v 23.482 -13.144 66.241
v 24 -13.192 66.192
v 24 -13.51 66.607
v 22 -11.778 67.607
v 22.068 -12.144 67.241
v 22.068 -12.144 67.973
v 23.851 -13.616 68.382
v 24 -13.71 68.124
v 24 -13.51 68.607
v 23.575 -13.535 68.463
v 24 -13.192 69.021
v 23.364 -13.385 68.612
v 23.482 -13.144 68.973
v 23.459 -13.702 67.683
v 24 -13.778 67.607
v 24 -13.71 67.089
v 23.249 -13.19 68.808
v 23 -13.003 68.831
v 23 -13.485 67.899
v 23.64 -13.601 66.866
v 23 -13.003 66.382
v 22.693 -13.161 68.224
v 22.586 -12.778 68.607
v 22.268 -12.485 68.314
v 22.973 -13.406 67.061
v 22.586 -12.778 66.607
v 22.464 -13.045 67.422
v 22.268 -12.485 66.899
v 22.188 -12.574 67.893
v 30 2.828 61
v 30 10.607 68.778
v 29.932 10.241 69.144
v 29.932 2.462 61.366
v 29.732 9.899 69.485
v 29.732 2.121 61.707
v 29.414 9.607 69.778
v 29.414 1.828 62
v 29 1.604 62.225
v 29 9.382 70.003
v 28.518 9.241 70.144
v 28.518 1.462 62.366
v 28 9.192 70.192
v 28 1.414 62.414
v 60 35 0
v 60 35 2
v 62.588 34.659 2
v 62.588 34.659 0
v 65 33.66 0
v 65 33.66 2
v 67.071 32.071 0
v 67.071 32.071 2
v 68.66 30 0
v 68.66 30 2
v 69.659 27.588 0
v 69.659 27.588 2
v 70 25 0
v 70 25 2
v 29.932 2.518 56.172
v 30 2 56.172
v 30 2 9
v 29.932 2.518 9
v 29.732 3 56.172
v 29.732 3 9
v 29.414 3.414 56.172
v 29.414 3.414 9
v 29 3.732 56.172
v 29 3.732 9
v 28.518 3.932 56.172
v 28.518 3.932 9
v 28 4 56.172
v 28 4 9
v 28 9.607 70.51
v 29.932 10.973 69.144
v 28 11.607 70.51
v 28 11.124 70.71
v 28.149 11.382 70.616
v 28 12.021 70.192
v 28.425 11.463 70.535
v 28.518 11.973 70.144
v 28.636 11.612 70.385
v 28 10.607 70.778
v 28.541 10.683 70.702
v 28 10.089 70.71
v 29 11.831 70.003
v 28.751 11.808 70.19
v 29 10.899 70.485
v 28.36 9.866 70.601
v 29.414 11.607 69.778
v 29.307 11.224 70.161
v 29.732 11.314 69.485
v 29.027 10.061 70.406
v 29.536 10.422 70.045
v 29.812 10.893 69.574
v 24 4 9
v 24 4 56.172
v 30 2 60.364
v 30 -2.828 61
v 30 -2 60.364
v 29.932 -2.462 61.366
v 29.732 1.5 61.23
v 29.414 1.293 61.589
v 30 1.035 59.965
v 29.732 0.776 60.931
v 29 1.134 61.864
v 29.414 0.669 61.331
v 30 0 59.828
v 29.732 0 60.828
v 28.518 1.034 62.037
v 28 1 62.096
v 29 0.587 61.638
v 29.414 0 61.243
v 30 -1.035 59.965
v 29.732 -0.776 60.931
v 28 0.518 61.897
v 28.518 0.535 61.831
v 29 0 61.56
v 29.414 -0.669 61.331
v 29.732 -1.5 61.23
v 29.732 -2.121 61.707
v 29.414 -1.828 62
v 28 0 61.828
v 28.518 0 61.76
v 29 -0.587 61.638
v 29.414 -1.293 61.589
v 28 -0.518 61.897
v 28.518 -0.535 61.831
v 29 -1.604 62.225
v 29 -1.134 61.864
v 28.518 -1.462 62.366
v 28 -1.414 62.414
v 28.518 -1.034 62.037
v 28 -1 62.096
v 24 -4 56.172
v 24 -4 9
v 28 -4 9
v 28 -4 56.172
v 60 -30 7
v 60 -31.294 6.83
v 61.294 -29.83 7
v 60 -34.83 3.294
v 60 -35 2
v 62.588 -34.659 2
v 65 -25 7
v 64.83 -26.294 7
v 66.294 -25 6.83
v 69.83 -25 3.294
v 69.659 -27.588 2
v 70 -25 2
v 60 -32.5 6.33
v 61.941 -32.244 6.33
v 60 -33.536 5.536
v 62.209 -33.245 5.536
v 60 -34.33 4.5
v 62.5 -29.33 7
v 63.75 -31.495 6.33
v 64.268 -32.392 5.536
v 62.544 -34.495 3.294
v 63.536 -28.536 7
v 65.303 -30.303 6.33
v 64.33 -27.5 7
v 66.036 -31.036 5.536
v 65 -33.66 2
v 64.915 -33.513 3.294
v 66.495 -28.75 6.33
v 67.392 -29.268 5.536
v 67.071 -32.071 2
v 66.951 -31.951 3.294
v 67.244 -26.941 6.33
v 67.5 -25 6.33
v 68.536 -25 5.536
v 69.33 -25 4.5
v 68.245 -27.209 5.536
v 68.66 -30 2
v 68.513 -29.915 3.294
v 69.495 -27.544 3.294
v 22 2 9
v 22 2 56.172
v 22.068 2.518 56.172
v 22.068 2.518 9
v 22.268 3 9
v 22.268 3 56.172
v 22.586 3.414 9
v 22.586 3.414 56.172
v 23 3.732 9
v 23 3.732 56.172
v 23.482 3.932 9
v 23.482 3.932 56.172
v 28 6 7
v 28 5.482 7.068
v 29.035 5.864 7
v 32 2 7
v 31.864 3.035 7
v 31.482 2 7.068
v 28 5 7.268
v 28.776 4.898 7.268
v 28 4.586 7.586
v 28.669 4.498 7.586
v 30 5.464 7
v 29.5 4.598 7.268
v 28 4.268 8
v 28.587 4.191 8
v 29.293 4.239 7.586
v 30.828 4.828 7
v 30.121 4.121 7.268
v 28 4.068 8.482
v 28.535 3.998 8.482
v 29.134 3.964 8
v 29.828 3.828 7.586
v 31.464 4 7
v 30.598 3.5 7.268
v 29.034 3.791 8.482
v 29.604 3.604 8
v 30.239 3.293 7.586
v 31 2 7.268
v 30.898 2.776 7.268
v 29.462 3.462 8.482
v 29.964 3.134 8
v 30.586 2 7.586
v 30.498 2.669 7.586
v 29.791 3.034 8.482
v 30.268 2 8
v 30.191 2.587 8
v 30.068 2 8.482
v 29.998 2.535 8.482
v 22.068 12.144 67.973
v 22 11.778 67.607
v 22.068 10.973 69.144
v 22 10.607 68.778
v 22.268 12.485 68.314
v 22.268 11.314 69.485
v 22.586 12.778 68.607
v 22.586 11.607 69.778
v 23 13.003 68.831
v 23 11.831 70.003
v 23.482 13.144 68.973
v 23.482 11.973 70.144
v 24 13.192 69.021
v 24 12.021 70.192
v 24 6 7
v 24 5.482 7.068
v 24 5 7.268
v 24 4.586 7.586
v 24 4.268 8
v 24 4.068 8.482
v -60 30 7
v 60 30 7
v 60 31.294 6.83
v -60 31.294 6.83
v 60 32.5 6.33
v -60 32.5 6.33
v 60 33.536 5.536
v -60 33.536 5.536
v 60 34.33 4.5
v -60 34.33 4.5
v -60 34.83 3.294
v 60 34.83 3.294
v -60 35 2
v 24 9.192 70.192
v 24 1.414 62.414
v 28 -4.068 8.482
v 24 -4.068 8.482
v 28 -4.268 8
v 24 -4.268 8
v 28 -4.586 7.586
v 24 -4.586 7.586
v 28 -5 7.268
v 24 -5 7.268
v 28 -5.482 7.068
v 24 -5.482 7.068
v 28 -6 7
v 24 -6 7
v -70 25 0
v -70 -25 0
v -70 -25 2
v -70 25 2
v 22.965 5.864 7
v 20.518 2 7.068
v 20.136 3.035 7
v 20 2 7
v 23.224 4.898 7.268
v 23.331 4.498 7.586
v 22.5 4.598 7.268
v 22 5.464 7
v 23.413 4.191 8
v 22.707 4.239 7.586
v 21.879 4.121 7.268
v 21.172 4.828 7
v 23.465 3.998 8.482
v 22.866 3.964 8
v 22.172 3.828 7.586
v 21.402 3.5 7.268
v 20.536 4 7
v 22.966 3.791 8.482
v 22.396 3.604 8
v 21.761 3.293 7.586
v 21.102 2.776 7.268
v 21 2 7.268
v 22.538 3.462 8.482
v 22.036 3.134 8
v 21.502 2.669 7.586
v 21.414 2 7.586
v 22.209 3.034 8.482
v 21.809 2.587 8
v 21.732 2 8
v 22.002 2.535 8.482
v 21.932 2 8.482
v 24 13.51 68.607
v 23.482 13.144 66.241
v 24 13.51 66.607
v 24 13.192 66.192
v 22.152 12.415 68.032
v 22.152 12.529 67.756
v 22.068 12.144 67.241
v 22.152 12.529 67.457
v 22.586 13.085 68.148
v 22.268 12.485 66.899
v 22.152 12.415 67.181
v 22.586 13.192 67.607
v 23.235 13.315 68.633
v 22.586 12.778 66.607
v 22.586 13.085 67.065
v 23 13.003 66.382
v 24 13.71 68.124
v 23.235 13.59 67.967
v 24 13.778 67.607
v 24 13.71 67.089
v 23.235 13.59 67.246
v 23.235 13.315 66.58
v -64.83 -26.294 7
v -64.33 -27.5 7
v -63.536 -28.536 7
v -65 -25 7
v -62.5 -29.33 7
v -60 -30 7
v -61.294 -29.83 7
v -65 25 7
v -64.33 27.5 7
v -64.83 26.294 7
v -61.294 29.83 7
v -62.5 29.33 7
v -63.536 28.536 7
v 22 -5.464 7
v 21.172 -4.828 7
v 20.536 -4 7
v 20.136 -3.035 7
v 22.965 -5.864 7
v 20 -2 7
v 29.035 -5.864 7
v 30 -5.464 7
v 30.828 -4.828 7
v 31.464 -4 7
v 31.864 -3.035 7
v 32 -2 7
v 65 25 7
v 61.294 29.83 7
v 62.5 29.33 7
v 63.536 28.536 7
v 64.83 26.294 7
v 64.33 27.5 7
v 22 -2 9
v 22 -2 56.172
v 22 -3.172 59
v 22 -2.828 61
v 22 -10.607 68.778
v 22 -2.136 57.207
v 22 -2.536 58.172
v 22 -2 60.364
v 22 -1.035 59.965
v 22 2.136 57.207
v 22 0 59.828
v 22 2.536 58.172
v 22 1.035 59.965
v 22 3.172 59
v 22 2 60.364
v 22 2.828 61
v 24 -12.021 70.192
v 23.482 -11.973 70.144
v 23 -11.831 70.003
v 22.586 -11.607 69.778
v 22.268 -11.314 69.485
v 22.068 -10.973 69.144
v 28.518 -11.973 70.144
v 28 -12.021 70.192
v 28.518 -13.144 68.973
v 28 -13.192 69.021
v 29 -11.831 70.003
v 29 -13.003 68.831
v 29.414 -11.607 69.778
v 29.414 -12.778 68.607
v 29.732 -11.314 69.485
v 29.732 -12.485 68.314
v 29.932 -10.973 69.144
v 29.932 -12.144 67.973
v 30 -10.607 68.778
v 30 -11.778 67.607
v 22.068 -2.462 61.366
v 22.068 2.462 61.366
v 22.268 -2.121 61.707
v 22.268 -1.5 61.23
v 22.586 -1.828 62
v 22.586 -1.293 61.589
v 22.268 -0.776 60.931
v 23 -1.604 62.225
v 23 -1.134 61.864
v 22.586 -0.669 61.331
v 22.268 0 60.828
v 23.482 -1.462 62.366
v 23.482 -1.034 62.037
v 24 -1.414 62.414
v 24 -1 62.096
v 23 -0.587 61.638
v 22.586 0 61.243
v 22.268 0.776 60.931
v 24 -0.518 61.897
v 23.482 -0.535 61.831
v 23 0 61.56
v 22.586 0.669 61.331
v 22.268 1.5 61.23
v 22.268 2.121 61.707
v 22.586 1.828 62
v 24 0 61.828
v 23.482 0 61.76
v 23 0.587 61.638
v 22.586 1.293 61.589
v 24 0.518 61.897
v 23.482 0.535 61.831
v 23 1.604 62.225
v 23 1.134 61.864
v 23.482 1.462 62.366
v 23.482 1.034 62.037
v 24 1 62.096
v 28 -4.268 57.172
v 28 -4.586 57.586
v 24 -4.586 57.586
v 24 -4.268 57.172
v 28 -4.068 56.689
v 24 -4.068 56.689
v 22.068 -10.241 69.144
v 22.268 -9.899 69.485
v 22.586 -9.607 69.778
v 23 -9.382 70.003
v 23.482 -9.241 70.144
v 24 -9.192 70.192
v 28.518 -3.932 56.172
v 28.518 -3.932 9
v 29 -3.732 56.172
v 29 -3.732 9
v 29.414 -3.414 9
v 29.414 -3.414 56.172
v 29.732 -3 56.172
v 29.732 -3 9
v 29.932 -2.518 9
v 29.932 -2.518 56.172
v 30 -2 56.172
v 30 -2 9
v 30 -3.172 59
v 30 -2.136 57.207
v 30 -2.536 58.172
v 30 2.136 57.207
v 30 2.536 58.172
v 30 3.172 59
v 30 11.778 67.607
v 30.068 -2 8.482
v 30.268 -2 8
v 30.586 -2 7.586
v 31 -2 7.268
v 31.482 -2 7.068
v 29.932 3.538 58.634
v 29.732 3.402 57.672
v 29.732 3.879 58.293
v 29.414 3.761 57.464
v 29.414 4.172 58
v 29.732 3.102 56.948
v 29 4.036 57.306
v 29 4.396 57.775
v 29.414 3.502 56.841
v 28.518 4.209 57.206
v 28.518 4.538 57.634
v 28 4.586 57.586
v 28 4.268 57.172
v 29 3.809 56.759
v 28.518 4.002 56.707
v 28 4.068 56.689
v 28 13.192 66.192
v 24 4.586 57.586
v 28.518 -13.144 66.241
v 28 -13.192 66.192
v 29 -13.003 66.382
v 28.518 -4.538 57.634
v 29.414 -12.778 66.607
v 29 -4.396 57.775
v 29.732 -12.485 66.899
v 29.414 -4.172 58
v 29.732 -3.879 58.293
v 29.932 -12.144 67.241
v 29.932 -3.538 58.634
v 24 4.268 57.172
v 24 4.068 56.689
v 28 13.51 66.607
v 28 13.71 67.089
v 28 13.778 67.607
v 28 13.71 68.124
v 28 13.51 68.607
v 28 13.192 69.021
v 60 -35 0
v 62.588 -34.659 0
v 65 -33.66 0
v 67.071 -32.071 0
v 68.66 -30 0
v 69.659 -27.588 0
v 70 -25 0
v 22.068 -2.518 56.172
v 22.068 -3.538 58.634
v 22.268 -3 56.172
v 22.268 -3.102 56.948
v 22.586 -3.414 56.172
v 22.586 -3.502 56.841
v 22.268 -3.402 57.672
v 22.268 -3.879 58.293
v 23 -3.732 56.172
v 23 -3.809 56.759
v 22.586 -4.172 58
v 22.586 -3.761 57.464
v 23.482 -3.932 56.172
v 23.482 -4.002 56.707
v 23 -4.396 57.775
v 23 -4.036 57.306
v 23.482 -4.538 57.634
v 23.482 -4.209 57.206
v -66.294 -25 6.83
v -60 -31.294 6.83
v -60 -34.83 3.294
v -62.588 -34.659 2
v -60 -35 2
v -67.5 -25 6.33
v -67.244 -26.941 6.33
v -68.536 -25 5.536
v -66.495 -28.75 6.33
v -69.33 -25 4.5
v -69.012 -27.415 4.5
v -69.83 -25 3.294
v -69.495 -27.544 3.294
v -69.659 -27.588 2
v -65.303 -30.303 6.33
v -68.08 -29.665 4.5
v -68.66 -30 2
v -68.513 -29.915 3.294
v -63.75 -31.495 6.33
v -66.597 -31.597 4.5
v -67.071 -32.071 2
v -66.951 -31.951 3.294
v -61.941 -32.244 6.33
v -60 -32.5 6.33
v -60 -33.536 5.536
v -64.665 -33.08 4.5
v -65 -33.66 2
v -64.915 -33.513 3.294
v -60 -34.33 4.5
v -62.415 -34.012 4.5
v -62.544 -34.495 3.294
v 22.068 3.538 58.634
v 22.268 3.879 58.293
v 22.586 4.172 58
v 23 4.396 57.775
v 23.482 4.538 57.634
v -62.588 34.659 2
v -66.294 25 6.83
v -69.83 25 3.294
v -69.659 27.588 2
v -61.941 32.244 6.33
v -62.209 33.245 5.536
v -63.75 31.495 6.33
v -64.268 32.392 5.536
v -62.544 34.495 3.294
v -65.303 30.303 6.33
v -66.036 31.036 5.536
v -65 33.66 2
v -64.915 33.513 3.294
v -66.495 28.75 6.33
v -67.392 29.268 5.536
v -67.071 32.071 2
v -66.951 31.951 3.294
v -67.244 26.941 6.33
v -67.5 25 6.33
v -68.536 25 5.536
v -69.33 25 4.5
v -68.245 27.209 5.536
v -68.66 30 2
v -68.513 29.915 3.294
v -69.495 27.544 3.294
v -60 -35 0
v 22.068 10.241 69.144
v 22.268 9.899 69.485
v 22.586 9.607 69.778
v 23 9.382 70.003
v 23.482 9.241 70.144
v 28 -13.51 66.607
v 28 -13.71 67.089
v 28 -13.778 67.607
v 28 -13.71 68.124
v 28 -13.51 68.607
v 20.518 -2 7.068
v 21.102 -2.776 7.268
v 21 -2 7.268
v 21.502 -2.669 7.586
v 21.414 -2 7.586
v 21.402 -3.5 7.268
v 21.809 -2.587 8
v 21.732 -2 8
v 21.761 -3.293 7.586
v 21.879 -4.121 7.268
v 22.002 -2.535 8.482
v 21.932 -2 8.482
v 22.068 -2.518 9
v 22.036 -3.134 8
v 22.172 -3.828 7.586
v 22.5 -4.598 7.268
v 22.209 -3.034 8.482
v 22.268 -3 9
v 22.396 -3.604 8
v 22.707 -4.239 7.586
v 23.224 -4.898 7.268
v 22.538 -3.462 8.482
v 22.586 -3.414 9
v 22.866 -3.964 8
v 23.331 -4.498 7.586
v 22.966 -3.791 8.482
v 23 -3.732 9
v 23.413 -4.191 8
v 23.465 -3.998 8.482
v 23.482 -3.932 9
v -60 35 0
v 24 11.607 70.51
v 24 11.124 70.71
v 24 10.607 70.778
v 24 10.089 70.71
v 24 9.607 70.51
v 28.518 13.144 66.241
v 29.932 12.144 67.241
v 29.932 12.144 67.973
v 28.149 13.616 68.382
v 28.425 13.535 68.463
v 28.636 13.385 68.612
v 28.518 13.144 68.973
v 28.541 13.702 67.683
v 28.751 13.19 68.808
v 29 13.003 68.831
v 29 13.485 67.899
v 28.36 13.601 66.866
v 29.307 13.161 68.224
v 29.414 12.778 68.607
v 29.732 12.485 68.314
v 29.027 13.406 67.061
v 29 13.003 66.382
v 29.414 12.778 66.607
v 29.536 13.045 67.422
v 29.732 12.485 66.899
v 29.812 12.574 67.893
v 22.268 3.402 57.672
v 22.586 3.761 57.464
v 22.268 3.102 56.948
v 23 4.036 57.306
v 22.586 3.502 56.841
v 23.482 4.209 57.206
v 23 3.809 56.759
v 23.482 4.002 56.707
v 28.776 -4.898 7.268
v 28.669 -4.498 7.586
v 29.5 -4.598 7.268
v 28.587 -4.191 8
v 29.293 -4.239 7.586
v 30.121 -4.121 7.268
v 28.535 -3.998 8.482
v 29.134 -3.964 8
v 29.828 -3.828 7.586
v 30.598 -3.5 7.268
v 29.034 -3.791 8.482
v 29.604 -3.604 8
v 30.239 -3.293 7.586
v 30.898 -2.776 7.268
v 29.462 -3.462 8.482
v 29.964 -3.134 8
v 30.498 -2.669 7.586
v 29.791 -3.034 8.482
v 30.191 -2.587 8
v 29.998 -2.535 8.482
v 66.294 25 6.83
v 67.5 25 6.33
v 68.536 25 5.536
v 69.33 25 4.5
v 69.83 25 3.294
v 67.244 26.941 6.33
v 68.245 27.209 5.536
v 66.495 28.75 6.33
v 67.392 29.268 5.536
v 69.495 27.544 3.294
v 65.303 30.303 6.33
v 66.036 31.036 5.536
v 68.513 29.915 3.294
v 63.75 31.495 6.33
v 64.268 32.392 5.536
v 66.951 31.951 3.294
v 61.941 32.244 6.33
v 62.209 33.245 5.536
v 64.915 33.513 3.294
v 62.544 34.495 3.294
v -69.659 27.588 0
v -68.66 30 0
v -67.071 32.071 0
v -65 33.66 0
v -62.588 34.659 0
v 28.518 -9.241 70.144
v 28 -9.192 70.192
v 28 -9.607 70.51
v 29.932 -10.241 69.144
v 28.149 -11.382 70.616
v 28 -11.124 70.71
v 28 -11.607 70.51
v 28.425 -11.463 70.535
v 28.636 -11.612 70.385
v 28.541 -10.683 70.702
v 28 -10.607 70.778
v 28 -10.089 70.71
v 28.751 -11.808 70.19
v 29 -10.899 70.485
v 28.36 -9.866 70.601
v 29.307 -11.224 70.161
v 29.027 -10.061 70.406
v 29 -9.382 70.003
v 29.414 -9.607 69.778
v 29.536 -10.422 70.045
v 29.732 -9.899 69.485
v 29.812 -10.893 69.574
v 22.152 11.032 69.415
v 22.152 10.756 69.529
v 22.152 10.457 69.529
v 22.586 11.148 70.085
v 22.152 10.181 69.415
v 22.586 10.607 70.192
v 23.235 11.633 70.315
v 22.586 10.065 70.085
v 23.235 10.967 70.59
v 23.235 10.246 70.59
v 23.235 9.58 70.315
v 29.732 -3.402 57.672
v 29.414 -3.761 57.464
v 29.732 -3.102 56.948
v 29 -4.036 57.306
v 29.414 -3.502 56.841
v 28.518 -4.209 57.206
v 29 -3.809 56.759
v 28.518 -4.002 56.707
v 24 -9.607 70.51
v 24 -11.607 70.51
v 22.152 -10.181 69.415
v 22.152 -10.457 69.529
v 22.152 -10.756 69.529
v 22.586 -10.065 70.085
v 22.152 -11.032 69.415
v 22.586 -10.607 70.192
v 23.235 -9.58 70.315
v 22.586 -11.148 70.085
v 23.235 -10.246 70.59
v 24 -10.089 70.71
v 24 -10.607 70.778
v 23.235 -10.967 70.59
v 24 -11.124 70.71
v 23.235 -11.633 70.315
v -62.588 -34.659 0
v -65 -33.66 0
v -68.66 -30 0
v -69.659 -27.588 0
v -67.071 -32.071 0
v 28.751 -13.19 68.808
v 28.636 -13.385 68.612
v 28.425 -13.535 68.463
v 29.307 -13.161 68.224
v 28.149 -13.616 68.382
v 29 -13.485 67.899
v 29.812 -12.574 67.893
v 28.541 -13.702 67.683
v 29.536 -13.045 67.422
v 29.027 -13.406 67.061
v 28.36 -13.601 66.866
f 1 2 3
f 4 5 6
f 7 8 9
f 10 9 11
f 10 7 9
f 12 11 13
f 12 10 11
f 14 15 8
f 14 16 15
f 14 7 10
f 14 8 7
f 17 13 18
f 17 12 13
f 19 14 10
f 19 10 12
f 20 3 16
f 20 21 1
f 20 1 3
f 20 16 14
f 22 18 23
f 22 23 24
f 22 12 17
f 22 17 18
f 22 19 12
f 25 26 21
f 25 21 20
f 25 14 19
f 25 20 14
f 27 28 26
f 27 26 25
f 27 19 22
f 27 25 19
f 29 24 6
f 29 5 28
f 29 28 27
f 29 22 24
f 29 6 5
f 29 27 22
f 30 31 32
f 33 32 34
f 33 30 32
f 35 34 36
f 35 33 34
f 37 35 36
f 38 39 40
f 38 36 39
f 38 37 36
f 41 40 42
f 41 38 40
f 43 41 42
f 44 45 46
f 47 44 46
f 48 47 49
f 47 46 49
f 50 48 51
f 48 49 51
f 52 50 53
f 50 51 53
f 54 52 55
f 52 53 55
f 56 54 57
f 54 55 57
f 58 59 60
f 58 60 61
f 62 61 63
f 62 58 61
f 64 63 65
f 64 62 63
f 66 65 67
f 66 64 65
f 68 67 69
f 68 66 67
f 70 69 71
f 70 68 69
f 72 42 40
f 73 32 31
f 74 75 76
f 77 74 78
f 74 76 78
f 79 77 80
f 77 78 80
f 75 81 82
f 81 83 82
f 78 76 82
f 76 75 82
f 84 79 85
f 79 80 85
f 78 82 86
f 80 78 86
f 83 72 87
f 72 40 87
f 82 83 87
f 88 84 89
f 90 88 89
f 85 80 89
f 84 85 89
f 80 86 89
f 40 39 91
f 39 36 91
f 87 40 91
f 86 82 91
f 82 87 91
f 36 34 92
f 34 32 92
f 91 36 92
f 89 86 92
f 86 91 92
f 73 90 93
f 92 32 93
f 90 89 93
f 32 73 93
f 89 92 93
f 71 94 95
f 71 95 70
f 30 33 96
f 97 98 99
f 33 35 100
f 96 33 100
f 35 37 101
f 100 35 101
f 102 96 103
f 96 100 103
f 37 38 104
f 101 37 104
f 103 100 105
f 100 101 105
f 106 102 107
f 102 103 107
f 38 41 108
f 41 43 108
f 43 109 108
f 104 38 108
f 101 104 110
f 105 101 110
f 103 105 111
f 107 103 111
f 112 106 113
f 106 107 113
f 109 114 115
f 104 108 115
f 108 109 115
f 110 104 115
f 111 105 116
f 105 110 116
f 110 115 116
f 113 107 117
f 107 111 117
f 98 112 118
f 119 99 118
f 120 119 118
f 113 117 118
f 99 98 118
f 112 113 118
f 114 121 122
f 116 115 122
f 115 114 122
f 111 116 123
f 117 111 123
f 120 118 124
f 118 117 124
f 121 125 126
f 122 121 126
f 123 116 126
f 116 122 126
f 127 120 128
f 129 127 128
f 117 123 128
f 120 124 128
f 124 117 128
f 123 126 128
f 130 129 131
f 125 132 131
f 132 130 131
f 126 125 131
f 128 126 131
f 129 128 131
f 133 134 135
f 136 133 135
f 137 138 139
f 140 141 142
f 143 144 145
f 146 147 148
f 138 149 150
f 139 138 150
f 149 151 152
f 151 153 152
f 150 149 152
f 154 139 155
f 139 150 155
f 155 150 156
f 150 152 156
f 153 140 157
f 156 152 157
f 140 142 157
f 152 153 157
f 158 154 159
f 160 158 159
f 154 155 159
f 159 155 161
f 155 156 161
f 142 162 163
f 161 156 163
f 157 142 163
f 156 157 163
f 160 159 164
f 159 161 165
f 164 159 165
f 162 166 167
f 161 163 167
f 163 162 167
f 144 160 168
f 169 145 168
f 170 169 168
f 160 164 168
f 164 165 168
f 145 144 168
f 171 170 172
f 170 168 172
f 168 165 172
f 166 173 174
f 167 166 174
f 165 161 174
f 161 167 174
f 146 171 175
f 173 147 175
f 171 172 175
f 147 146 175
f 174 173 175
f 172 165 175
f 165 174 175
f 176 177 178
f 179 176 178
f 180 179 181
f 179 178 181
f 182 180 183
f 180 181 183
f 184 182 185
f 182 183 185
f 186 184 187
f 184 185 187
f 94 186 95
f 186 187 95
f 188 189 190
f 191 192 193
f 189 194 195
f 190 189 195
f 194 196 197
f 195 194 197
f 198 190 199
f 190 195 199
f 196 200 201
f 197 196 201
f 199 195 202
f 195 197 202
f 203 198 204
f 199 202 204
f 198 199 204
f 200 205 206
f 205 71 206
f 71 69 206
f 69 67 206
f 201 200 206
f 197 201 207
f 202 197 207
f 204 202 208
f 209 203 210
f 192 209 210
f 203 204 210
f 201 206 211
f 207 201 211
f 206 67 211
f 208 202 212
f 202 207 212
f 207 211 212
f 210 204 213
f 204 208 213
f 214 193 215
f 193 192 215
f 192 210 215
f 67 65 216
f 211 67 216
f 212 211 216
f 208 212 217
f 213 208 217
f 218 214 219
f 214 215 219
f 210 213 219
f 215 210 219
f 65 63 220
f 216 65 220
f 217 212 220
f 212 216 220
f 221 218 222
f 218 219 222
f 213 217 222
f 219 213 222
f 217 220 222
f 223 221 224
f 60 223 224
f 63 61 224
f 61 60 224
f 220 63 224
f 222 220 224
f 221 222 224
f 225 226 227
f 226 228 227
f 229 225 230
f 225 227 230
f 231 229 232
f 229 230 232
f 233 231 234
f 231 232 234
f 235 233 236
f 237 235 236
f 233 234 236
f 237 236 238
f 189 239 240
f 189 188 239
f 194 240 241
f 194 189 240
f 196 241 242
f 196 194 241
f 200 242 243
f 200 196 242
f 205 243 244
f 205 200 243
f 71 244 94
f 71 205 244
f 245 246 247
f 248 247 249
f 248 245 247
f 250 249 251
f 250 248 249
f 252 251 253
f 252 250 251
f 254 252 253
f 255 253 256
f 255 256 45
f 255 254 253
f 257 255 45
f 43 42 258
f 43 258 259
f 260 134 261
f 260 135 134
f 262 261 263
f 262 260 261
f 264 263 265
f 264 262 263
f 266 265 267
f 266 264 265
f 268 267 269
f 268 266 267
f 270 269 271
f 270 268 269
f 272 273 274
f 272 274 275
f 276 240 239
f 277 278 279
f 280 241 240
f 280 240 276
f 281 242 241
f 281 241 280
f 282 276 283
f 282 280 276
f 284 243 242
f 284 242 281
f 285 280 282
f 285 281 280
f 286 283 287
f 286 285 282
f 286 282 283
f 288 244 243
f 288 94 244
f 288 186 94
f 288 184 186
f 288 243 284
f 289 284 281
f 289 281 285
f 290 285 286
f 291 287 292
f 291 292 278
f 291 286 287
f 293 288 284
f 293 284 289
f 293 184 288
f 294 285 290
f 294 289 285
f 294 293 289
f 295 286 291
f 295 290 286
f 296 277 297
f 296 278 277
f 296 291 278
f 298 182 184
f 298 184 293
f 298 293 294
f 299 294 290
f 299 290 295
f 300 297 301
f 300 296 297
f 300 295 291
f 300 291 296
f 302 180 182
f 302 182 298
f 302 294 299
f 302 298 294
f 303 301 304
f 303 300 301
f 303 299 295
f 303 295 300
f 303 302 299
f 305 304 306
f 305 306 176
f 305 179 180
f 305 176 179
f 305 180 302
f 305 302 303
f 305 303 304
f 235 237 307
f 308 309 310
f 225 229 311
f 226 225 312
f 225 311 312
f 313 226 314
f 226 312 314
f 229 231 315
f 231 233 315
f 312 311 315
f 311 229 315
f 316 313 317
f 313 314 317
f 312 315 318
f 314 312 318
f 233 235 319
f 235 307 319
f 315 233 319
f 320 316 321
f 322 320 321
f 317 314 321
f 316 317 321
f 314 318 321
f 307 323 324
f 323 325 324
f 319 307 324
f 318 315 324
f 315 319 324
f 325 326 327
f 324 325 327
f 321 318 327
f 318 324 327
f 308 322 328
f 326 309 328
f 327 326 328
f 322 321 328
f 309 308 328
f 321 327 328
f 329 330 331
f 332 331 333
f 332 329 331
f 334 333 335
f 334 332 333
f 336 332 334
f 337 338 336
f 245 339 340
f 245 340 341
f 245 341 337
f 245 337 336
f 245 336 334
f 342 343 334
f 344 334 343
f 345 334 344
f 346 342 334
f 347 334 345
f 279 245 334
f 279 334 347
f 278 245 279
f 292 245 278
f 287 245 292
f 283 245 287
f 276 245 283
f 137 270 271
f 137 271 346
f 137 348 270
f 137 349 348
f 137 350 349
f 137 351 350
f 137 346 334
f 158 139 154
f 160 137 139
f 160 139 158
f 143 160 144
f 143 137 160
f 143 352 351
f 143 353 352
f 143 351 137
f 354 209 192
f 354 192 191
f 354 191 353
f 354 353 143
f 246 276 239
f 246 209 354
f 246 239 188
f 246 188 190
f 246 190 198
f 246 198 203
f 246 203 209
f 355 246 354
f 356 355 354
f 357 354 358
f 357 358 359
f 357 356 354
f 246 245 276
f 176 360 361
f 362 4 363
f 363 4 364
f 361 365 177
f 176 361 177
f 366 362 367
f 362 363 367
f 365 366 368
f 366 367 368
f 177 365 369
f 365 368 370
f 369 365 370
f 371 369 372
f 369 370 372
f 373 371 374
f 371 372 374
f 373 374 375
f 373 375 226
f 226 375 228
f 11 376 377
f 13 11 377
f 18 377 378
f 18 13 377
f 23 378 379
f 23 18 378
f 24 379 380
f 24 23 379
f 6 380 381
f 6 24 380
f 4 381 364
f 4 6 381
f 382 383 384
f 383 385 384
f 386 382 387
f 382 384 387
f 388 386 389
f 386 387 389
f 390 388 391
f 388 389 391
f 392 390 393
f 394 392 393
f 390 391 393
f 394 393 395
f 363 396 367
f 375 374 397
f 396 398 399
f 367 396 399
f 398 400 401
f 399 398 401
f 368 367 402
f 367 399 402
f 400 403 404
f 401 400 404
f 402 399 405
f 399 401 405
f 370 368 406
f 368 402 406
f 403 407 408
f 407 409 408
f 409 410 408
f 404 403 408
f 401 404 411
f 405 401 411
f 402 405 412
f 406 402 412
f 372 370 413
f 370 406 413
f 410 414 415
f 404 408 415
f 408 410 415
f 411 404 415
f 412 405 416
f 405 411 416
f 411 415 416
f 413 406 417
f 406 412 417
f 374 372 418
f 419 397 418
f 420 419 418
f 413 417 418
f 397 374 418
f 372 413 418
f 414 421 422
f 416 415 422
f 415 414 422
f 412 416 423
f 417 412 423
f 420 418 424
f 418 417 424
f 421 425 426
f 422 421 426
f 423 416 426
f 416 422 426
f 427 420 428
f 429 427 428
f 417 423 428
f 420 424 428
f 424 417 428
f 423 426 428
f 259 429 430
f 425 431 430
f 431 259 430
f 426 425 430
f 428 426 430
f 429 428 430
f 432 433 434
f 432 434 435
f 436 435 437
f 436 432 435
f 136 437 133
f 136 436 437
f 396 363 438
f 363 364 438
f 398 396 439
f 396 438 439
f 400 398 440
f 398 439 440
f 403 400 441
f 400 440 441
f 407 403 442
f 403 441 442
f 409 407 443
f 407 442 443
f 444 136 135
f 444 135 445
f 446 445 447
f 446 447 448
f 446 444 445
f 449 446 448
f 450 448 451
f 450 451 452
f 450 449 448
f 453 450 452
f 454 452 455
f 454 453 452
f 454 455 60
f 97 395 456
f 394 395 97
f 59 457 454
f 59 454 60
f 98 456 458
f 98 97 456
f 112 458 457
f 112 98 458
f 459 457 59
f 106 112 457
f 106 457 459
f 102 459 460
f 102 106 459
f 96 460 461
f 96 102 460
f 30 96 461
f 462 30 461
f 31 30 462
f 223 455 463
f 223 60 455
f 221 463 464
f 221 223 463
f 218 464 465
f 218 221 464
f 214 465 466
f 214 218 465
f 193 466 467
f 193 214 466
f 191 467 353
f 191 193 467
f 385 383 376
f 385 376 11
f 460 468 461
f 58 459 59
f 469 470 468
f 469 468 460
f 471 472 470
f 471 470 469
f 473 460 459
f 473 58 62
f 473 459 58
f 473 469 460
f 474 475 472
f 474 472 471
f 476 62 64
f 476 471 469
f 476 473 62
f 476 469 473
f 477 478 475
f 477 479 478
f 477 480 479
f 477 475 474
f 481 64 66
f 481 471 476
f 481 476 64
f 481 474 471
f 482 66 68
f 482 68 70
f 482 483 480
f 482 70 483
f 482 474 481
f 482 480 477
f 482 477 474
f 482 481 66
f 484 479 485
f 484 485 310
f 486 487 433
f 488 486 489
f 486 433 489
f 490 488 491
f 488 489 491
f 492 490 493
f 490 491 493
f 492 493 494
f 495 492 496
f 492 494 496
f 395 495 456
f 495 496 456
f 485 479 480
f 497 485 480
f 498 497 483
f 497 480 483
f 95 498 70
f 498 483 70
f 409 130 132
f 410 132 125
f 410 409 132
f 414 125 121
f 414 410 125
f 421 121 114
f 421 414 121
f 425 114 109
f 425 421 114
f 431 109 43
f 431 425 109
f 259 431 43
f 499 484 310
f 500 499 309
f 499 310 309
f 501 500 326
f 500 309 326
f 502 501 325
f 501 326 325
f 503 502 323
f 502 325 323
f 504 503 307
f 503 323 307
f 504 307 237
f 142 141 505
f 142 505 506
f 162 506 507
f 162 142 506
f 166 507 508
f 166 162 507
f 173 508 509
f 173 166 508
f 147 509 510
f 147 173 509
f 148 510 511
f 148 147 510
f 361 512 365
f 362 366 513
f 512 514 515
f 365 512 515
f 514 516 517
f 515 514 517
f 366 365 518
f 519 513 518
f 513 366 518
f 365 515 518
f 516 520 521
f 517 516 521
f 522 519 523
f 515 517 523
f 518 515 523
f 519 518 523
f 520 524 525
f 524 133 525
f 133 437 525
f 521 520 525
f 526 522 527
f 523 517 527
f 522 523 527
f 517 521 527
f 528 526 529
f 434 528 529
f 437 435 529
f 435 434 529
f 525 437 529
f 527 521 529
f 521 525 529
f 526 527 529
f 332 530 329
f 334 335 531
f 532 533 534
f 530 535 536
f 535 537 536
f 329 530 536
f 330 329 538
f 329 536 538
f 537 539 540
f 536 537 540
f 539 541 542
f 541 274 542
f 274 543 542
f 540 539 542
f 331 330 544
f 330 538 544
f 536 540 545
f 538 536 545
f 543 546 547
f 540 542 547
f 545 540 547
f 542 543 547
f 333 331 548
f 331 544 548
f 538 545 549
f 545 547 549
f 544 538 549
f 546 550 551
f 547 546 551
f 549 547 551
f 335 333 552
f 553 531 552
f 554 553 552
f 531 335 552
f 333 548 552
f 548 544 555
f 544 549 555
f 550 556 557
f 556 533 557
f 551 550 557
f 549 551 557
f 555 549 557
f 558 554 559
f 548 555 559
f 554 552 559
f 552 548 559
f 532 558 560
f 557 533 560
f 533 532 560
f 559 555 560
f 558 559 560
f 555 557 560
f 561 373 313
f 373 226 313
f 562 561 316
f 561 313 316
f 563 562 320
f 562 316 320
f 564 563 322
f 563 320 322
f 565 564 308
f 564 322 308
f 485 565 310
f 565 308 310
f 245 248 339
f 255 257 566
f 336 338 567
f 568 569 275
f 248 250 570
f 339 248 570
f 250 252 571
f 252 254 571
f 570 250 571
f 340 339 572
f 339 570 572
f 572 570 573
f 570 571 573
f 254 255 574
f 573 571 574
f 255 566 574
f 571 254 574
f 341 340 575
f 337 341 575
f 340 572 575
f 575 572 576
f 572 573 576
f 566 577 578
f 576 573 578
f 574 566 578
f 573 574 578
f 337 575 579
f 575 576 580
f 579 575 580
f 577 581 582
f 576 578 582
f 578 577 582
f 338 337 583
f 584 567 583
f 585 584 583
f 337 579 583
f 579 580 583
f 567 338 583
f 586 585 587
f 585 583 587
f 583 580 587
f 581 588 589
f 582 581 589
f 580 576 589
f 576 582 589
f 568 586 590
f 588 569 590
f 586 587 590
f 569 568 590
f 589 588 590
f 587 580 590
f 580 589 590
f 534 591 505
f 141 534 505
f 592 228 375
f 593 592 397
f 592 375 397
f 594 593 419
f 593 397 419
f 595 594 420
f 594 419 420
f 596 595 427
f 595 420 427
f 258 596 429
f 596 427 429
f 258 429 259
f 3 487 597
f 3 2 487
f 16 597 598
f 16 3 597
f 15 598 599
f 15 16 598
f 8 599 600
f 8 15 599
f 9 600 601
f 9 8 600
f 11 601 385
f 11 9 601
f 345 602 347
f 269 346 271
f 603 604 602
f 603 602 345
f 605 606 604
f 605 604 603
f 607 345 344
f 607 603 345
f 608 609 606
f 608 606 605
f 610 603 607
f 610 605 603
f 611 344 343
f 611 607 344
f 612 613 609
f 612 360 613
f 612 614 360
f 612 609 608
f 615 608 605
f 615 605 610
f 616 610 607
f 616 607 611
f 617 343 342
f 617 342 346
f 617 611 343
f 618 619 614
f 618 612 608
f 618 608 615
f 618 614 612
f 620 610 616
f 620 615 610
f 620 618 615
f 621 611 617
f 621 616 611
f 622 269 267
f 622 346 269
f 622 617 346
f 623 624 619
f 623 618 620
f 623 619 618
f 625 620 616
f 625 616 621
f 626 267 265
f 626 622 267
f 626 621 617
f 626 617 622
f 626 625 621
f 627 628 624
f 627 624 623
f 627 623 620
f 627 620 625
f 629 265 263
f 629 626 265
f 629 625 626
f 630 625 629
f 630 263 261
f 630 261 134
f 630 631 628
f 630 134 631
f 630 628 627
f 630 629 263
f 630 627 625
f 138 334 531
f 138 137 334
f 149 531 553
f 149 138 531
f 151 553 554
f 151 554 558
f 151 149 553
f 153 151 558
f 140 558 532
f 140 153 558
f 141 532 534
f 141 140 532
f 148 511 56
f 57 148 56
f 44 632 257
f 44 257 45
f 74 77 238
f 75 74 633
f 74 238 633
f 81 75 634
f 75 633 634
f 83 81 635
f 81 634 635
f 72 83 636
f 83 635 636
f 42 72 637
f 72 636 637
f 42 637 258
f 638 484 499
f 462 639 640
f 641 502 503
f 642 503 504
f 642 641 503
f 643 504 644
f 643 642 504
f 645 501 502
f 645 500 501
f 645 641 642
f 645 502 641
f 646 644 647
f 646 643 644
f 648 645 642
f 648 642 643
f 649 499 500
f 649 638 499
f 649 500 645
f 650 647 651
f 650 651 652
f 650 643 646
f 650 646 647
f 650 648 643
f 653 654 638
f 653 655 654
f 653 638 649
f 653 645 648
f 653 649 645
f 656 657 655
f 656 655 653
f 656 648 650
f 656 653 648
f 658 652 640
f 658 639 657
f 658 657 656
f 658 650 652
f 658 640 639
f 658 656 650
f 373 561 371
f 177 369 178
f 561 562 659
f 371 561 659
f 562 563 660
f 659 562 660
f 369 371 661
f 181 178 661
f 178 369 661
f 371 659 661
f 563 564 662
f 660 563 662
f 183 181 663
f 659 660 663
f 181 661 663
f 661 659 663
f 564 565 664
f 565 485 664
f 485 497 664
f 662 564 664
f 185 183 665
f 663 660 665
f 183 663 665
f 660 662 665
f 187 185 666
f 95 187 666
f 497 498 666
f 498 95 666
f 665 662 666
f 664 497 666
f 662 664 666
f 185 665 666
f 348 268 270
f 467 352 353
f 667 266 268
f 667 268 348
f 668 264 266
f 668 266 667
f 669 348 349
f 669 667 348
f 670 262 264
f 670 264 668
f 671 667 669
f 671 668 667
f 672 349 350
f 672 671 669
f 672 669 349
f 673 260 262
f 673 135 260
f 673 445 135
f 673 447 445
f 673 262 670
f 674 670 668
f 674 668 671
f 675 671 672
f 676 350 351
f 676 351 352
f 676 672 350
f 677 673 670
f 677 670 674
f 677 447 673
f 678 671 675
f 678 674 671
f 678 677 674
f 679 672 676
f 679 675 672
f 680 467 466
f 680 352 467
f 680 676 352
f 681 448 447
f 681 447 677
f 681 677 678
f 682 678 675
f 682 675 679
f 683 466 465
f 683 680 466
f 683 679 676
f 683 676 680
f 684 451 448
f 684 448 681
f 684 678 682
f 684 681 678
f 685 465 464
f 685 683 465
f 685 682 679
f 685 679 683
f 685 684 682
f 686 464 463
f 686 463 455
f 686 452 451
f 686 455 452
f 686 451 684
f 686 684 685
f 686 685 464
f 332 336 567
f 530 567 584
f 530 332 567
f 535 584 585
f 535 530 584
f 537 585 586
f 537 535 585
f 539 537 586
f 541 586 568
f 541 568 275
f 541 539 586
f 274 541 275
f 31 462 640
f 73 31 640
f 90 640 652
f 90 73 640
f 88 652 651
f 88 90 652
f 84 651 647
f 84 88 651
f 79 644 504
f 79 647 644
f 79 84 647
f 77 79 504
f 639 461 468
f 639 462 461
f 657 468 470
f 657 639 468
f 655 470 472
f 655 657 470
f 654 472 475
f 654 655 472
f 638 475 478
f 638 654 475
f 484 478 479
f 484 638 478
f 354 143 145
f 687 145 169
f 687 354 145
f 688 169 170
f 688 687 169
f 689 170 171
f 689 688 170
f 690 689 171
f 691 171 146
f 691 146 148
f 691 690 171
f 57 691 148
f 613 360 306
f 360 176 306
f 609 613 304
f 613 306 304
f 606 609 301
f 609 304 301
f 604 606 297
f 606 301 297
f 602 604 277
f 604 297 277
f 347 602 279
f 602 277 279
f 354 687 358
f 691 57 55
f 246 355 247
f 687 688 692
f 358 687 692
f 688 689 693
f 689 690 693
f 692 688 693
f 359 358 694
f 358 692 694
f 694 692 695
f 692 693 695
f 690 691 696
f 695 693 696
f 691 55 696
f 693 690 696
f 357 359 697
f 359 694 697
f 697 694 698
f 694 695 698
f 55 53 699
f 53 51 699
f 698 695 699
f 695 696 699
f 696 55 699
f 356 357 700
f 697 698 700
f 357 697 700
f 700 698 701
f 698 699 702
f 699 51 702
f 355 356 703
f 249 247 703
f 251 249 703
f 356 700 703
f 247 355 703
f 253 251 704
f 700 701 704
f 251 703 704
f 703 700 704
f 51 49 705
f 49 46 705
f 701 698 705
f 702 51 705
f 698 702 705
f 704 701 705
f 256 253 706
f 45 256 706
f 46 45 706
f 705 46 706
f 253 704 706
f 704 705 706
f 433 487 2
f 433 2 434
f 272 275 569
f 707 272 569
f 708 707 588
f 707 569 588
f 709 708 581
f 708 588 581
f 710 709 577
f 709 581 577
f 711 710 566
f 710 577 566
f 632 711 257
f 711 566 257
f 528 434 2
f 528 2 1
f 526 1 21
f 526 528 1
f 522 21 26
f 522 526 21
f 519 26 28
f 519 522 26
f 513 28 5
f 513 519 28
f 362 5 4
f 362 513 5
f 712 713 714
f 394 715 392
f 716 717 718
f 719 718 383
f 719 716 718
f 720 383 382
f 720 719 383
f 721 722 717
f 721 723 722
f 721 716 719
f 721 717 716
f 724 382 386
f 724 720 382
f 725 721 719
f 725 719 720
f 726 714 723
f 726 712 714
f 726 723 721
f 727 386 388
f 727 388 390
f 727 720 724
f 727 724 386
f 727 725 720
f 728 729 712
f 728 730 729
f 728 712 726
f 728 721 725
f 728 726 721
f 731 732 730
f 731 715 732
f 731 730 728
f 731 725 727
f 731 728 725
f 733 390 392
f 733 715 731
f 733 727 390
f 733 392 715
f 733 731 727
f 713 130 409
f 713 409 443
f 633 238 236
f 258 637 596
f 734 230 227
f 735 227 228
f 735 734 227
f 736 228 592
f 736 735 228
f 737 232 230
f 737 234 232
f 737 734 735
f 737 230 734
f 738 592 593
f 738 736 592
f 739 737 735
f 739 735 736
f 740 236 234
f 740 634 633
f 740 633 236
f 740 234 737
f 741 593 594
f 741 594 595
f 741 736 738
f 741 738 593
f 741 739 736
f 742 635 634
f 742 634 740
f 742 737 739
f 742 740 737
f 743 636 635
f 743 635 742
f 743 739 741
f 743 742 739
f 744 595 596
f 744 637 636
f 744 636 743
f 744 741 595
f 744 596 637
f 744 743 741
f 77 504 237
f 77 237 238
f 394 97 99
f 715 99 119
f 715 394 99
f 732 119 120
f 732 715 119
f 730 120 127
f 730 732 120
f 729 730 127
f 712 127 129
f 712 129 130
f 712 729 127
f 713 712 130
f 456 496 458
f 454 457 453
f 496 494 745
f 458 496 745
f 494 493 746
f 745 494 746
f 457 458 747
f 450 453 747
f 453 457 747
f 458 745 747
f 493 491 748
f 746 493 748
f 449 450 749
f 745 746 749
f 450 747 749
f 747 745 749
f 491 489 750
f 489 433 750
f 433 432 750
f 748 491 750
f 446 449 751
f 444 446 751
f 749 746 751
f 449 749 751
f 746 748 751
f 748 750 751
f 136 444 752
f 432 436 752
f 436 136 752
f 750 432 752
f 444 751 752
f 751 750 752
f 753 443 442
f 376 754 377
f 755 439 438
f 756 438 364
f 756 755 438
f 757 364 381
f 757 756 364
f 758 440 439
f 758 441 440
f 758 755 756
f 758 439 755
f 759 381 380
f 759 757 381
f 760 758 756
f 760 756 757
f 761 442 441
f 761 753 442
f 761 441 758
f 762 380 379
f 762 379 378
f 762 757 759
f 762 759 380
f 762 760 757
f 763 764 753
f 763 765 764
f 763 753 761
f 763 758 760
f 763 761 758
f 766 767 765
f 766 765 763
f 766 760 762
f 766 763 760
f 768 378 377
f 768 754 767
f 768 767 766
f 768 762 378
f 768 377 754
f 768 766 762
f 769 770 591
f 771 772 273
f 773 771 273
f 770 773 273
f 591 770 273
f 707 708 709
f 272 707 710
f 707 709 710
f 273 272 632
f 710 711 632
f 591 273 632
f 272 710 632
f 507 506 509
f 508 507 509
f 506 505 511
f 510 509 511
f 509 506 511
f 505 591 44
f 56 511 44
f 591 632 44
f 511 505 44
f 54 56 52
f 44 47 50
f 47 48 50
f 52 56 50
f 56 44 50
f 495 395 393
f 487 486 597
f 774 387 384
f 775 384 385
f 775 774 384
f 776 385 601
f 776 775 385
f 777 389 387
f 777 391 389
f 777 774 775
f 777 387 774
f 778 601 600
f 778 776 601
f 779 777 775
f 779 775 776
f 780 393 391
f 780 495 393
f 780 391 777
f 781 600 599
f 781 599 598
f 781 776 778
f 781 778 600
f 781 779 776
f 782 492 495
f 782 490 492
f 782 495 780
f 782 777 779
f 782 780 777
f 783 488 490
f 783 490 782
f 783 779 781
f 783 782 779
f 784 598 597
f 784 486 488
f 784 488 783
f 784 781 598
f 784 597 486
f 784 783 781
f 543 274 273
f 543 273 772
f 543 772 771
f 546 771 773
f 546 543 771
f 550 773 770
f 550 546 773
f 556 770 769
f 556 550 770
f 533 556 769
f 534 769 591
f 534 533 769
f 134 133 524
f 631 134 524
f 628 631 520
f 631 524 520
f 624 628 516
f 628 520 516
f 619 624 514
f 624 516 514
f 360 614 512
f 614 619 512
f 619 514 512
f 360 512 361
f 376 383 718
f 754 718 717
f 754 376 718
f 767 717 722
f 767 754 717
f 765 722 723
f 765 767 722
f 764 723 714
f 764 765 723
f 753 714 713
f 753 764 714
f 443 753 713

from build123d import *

# Parameters (mm, degrees)
F0_W     = 140
F0_H     = 70
F1_DEPTH = 7
F2_W     = 8
F2_H     = 8
F3_DEPTH = 50
F5_DEPTH = 8
F6_R     = 10
F7_R     = 5
F9_R     = 2


with BuildPart() as f1:
    # F0 (on Top) → F1 (new body)
    with BuildSketch(Plane.XY):
        Rectangle(F0_W, F0_H)
    extrude(amount=F1_DEPTH)

    # F2 (on face) → F3 (join)
    with BuildSketch(Plane.XY.offset(7)):
        with Locations((26, 0)):
            Rectangle(F2_W, F2_H)
    extrude(amount=F3_DEPTH)

    # F6
    f6_edges = [f1.edges().sort_by_distance(p)[0] for p in [
        (-70, 35, 3.5),
        (-70, -35, 3.5),
        (70, 35, 3.5),
        (70, -35, 3.5),
    ]]
    fillet(f6_edges, radius=F6_R)

    # F7
    f7_edges = [f1.edges().sort_by_distance(p)[0] for p in [
        (0, -35, 7),
        (70, 0, 7),
        (0, 35, 7),
        (-70, 0, 7),
    ]]
    fillet(f7_edges, radius=F7_R)


with BuildPart() as f5:
    # F4 (on face) → F5 (new body)
    with BuildSketch(Plane.YZ.offset(30)):
        Polygon((-14.606602, 67.606602), (-4, 57), (4, 57), (14.606602, 67.606602), (10.606602, 71.606602), (0, 61), (-10.606602, 71.606602), align=None)
    extrude(amount=-F5_DEPTH)


with BuildPart() as f1_1:
    add(f1.part)

    # F8: union F5
    add(f5.part)

    # F9
    f9_edges = [f1_1.edges().sort_by_distance(p)[0] for p in [
        (30, 9.303301, 62.303301),
        (30, 4, 32),
        (30, 5.303301, 66.303301),
        (30, -5.303301, 66.303301),
        (30, -9.303301, 62.303301),
        (30, -4, 32),
        (26, 10.606602, 71.606602),
        (26, -10.606602, 71.606602),
        (26, 0, 61),
        (26, 14.606602, 67.606602),
        (30, -12.606602, 69.606602),
        (30, 12.606602, 69.606602),
        (22, 12.606602, 69.606602),
        (22, -5.303301, 66.303301),
        (26, -4, 57),
        (26, -4, 7),
        (22, -4, 32),
        (22, -9.303301, 62.303301),
        (26, -14.606602, 67.606602),
        (22, -12.606602, 69.606602),
        (22, 5.303301, 66.303301),
        (22, 9.303301, 62.303301),
        (22, 4, 32),
        (26, 4, 57),
        (26, 4, 7),
        (22, 0, 7),
        (30, 0, 7),
    ]]
    fillet(f9_edges, radius=F9_R)


solid = f1_1.part
